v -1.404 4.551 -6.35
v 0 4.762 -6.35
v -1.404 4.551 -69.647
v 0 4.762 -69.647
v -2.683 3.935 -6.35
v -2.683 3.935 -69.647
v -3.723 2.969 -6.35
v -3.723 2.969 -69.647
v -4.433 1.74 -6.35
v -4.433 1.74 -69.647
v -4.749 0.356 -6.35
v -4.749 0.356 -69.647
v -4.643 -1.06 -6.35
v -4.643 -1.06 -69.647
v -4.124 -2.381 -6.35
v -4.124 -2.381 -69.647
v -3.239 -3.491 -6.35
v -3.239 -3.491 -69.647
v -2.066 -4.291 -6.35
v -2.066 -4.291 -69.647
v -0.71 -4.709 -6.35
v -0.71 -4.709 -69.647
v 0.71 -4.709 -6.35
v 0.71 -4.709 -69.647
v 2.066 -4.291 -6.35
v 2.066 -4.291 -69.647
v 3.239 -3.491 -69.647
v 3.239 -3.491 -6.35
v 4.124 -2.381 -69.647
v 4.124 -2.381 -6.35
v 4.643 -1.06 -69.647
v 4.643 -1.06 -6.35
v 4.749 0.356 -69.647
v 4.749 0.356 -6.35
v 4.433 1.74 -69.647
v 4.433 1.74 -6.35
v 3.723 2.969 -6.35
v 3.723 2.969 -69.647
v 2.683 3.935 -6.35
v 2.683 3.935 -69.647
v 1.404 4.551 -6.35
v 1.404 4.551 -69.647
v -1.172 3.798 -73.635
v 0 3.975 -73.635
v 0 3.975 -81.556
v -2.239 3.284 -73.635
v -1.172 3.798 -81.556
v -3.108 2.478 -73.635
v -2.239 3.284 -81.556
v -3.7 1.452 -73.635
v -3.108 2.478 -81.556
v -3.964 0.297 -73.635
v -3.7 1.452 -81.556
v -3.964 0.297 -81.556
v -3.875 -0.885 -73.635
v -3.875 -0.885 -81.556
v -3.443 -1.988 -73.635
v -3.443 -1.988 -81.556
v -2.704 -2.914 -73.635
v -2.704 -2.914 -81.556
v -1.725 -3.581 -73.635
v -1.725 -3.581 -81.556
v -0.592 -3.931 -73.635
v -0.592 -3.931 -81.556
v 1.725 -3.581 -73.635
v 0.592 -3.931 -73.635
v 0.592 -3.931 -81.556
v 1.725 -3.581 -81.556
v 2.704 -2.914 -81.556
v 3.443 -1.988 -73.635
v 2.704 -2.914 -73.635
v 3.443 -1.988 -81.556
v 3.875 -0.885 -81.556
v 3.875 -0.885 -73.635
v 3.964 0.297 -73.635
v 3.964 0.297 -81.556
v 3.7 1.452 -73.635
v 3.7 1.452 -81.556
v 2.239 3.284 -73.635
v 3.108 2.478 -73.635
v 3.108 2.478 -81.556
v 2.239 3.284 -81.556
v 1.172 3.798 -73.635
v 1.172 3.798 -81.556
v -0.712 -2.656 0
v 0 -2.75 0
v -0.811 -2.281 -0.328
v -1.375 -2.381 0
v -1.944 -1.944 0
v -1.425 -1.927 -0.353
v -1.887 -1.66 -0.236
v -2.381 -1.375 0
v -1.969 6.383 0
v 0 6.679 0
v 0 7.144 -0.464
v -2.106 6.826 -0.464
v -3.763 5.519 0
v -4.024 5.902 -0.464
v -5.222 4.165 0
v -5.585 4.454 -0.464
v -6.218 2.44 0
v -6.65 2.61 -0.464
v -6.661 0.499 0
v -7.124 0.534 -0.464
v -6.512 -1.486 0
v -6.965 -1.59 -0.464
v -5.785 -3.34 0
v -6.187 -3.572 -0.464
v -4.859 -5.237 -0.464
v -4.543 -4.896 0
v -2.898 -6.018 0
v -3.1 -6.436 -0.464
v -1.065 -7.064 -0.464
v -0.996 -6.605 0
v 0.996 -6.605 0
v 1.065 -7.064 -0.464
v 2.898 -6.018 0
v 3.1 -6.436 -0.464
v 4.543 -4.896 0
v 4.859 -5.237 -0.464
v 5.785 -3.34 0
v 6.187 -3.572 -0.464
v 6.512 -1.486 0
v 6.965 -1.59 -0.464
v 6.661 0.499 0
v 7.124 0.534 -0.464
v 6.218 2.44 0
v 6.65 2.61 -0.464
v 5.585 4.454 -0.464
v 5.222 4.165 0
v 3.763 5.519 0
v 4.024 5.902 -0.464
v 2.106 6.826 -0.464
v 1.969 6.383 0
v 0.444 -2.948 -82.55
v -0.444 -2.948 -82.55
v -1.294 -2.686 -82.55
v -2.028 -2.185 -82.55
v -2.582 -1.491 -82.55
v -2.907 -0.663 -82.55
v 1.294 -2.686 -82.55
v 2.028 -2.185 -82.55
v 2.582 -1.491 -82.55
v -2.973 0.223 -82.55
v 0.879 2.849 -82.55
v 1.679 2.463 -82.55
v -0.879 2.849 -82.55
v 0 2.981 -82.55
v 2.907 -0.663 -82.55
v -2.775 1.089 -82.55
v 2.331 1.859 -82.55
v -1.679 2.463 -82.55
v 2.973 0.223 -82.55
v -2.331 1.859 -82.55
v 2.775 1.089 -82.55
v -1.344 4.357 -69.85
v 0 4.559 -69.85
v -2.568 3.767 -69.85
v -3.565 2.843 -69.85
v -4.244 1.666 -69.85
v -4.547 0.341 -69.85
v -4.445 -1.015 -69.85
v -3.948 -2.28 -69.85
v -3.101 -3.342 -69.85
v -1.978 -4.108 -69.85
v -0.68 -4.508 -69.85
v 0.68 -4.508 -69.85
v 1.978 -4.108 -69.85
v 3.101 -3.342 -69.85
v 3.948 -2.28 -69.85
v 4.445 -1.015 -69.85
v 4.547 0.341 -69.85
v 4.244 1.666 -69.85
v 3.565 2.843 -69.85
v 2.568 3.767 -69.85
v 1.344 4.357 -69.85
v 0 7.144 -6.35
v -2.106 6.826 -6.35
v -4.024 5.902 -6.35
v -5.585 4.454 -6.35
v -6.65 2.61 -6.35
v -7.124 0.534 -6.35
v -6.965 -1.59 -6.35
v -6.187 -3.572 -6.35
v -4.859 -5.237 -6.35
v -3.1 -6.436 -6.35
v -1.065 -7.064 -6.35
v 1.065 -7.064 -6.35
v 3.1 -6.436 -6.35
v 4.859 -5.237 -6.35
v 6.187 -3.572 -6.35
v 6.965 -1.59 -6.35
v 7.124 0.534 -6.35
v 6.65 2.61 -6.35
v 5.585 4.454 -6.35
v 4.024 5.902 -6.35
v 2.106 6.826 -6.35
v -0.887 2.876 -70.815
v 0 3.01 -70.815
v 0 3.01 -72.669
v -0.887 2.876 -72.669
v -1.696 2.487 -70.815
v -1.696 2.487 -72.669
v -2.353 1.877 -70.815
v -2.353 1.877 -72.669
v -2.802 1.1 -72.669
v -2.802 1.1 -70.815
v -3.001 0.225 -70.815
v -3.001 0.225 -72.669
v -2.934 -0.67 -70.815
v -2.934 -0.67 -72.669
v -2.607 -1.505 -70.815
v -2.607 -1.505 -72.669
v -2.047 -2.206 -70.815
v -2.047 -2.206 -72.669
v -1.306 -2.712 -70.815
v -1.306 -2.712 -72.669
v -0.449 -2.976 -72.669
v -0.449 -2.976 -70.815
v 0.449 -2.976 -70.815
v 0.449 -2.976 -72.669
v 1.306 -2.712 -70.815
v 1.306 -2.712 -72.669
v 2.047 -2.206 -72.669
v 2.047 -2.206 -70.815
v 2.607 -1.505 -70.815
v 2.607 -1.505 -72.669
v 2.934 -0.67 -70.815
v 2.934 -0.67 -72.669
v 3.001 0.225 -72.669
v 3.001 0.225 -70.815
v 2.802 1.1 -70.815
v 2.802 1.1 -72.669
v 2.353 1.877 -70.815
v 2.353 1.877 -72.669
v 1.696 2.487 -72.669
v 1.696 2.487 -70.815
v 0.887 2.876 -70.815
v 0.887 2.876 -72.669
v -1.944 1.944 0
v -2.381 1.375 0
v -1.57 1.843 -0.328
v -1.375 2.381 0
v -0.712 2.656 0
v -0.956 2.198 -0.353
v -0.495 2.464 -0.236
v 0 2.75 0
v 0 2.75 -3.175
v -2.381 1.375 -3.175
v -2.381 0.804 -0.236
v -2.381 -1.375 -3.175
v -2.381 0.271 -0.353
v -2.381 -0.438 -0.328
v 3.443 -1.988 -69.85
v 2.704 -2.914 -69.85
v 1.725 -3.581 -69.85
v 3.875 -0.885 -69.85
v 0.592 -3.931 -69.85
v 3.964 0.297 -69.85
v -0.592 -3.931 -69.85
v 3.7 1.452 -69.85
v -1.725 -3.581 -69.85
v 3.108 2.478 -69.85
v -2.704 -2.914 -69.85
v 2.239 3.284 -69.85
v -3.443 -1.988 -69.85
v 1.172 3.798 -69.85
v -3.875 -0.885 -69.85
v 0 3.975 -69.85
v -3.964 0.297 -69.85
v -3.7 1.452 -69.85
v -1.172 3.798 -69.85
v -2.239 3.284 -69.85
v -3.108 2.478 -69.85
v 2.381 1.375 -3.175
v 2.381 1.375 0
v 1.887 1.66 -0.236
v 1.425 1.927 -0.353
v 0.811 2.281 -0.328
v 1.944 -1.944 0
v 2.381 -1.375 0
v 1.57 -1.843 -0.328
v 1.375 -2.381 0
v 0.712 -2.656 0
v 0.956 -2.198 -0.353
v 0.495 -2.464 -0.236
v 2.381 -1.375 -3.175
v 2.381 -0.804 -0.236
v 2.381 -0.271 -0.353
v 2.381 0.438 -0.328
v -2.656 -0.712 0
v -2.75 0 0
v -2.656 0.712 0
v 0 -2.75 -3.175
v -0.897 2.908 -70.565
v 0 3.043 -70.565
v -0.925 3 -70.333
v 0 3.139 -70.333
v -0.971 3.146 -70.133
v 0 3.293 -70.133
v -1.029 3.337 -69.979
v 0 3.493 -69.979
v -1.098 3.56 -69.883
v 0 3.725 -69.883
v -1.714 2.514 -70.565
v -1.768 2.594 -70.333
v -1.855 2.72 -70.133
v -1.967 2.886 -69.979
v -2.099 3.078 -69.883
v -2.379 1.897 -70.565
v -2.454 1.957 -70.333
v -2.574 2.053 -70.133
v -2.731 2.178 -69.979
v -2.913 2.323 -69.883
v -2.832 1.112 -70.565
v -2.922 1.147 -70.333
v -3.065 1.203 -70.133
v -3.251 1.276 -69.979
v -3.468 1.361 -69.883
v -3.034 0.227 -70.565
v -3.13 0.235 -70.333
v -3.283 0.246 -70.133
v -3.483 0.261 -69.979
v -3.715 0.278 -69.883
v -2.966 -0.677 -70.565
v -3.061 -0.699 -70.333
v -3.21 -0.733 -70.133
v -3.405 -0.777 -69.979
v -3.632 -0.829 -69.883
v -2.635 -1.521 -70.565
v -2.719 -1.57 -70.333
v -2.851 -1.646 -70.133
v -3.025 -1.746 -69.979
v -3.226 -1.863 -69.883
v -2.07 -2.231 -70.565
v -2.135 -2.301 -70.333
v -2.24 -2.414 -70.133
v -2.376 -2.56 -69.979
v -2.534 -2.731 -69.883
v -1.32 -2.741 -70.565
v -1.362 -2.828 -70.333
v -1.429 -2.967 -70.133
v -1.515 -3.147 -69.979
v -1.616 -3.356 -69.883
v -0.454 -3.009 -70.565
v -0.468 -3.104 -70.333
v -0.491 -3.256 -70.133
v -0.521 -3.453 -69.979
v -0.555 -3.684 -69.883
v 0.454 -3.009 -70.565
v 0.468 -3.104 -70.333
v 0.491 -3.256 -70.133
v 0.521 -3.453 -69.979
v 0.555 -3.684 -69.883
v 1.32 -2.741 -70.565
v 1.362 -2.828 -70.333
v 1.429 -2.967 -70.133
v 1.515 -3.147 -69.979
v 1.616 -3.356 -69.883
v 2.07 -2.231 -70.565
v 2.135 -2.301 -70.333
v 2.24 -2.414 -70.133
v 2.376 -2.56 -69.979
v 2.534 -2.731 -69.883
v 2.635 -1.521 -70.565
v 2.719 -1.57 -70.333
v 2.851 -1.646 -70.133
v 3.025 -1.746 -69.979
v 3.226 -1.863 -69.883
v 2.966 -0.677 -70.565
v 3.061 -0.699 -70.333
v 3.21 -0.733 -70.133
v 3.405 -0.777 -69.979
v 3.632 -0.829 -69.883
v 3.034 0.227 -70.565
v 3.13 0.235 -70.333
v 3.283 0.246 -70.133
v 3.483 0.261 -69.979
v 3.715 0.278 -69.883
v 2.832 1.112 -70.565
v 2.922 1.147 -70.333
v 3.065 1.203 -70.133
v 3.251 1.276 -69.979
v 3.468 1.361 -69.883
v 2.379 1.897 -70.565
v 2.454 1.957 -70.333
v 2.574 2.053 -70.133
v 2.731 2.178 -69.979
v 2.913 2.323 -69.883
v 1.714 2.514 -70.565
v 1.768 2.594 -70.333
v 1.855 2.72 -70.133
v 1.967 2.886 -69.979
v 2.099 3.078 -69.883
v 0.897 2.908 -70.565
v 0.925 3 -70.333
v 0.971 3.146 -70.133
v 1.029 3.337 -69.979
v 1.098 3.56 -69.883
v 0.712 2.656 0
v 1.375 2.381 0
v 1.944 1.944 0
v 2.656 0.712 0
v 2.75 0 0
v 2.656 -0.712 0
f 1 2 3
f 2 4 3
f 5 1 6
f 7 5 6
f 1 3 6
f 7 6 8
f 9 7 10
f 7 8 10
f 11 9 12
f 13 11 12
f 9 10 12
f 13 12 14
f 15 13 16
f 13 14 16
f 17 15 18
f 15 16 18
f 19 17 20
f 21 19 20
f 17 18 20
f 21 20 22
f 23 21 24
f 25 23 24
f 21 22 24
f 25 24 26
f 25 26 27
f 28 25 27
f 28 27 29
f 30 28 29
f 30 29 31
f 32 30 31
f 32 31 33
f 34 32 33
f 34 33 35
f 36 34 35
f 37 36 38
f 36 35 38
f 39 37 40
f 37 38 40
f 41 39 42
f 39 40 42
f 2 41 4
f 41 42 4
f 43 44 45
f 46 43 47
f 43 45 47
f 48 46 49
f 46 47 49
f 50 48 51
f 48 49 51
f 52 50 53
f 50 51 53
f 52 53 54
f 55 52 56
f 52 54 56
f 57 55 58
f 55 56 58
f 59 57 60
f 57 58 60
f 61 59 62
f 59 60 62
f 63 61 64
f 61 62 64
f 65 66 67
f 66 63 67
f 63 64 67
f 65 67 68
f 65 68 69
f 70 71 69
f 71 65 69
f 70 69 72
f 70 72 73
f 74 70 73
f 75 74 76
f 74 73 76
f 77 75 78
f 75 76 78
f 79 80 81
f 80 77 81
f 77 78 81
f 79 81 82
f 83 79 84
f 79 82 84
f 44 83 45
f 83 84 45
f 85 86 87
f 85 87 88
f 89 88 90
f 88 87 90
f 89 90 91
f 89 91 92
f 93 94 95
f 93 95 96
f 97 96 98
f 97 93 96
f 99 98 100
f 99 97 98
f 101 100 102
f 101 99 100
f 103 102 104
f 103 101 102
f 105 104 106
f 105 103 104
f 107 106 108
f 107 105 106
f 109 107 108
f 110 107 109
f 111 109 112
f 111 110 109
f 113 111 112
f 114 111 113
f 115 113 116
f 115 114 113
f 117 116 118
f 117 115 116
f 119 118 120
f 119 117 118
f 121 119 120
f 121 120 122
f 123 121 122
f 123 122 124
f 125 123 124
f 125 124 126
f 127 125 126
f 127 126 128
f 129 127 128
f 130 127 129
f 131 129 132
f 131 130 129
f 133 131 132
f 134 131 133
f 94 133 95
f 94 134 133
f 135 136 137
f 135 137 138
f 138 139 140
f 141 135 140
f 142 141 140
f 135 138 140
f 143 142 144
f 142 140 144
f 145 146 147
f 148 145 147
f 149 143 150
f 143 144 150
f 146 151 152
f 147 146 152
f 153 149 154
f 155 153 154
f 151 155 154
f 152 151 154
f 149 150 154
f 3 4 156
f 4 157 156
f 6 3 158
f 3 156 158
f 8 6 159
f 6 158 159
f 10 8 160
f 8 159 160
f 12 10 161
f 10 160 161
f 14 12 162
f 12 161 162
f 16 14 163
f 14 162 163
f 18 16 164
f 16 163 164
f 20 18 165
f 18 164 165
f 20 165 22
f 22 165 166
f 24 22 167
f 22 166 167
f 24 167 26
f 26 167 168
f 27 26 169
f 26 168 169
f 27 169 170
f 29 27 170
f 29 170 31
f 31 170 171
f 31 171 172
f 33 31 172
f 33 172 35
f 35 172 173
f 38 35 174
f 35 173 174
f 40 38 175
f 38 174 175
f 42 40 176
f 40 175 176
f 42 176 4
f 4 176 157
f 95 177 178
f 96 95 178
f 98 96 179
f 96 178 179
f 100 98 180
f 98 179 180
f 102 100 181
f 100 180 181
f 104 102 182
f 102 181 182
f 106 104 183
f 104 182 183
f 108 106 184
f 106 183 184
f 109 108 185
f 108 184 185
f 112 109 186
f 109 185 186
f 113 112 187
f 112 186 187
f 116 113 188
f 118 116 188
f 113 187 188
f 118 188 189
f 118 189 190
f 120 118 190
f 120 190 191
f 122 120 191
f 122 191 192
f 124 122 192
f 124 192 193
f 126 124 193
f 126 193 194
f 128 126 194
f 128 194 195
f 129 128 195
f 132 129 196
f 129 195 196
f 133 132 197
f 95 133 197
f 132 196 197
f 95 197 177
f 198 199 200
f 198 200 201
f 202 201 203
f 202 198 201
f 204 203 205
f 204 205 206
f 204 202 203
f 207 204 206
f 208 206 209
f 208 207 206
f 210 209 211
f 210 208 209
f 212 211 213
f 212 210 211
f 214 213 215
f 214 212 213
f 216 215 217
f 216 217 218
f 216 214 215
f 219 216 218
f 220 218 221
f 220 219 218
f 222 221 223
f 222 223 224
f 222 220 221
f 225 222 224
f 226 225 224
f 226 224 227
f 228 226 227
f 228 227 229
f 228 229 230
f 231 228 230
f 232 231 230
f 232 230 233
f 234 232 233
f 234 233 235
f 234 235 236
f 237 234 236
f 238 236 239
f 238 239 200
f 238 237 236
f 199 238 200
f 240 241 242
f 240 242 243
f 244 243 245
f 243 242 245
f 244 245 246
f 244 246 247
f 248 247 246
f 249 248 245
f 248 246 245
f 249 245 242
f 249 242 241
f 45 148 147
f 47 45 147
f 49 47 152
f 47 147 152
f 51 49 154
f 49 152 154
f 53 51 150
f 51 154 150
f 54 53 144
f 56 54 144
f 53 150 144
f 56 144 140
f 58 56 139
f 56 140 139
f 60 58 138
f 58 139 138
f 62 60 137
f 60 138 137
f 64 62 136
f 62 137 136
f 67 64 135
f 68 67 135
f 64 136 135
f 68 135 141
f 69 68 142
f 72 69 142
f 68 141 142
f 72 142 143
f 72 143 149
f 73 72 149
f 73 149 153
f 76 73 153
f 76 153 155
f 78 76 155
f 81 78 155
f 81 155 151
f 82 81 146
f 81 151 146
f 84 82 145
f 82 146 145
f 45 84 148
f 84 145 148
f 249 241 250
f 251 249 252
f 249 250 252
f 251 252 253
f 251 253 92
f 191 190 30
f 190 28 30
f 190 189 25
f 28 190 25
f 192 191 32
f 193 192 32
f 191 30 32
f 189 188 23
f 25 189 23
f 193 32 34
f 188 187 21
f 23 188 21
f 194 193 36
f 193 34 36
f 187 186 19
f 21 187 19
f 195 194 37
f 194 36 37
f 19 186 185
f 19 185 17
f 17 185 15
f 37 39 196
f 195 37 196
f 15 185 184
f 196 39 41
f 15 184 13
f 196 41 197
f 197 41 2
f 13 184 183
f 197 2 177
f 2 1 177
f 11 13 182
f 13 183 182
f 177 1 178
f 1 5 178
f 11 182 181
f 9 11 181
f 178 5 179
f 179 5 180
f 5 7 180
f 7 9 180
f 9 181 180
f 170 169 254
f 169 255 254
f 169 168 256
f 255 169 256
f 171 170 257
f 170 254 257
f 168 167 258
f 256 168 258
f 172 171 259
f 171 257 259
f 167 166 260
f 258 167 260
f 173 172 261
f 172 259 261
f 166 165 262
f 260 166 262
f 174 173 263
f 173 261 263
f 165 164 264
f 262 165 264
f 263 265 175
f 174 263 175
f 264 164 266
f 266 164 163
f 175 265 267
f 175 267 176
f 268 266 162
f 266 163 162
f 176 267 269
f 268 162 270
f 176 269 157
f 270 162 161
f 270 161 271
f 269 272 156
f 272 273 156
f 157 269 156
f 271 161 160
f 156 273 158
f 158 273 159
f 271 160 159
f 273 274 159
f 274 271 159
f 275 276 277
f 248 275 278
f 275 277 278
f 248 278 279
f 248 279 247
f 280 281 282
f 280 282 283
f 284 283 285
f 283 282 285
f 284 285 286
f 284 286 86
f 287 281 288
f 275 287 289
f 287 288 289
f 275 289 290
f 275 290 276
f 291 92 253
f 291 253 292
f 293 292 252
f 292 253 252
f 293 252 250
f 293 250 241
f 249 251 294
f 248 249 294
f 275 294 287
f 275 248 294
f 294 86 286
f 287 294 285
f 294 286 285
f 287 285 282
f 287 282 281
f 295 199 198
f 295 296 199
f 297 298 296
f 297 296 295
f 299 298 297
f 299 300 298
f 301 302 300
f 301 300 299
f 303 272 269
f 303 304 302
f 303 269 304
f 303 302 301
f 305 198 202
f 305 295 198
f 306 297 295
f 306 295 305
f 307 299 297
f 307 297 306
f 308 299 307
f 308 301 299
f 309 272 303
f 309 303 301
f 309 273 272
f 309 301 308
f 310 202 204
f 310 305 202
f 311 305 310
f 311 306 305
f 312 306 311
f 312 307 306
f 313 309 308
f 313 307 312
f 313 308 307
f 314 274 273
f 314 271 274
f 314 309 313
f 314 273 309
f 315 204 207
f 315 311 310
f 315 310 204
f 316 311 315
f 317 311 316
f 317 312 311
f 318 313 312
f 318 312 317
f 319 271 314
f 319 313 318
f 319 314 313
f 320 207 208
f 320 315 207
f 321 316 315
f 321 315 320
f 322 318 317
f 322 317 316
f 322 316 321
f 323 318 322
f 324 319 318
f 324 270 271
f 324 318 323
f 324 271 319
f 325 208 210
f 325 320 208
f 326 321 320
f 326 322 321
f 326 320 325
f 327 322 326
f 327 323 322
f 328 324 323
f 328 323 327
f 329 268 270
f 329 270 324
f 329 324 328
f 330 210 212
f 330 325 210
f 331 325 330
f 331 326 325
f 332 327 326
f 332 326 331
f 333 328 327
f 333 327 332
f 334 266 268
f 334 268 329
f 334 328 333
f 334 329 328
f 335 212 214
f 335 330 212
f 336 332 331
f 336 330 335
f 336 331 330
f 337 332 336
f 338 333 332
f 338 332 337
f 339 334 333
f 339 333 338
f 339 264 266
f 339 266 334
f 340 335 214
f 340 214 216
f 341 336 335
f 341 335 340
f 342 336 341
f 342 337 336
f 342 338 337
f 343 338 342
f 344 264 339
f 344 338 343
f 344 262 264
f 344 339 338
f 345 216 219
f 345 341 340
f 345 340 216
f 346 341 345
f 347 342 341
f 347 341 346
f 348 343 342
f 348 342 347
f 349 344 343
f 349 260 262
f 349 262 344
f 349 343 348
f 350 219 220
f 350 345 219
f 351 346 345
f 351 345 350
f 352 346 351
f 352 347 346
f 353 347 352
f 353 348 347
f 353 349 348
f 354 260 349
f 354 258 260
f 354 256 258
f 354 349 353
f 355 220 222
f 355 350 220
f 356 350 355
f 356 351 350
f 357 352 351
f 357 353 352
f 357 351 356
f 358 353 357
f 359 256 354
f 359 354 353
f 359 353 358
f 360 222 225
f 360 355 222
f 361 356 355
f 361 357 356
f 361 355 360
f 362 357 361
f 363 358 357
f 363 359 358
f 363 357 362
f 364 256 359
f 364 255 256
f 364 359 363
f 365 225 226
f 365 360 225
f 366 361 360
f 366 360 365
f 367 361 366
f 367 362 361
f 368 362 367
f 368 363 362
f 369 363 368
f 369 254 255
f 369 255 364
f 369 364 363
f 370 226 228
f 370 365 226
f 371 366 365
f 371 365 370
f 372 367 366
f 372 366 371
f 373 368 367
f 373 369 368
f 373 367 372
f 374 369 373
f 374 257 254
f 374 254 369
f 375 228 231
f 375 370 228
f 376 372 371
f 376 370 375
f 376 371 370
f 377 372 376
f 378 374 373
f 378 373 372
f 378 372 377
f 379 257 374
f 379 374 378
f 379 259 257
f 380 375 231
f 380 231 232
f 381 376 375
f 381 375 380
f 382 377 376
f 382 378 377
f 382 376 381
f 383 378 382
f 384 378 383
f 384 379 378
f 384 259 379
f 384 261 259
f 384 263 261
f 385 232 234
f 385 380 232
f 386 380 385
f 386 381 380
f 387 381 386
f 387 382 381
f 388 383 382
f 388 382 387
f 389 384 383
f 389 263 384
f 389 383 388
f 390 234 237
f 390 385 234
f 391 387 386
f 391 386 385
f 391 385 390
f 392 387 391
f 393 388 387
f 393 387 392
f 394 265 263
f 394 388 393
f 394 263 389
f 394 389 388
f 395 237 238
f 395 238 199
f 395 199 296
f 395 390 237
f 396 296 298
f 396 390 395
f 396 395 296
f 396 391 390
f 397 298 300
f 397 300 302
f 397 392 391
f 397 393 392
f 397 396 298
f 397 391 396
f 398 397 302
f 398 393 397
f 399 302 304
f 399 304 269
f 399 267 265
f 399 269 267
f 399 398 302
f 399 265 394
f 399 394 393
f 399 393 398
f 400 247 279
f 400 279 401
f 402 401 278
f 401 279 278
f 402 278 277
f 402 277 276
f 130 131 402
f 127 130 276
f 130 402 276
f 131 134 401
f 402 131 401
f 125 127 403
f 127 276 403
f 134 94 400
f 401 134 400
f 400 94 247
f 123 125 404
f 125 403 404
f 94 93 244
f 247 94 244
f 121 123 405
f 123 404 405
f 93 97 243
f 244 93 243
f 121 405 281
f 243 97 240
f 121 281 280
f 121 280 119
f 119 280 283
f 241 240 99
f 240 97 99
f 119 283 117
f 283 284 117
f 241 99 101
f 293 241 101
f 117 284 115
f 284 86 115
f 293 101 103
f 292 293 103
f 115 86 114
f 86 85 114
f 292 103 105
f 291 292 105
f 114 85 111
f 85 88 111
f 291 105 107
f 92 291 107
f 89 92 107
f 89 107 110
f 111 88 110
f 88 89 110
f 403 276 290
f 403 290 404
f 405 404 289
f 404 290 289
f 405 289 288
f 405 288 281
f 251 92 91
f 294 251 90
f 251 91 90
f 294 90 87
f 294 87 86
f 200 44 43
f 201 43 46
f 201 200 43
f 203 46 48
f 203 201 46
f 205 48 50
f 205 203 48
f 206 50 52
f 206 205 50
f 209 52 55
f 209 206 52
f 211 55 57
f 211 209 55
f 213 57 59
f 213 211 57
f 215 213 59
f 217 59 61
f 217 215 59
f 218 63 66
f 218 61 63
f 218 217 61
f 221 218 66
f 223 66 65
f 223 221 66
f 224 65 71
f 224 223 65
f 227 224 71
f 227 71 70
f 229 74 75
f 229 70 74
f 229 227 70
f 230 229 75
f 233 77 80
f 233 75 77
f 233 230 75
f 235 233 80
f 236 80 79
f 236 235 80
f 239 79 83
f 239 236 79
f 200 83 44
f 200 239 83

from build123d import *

# Parameters (mm, degrees)
CHAMFER1_SIZE      = 0.993775
CHAMFER2_SIZE      = 0.46434375
CHAMFER3_SIZE      = 0.2032
CUT_EXTRUDE2_DEPTH = 3.175


with BuildPart() as part:
    # Sketch1 → Revolve1 (revolve)
    with BuildSketch(Plane(origin=(0, 0, 0), x_dir=(0, 0, -1), z_dir=(1, 0, 0))):
        Polygon((0, 7.14375), (6.35, 7.14375), (6.35, 4.7625), (69.85, 4.7625), (69.85, 3.9751), (82.55, 3.9751), (82.55, 0), (0, 0), align=None)
    revolve(axis=Axis((0, 0, -82.55), (0, 0, 1)))

    # Sketch5 → Cut-Revolve1 (revolve, cut)
    with BuildSketch(Plane(origin=(0, 0, 0), x_dir=(0, 0, -1), z_dir=(1, 0, 0))):
        with BuildLine():
            Line((69.85, 4.7625), (74.422, 4.7625))
            Line((74.422, 4.7625), (72.6694, 3.0099))
            Line((72.6694, 3.0099), (70.8152, 3.0099))
            ThreePointArc((70.8152, 3.0099), (70.132700535, 3.292600535), (69.85, 3.9751))
            Line((69.85, 3.9751), (69.85, 4.7625))
        make_face()
    revolve(axis=Axis((0, 0, -82.55), (0, 0, 1)), mode=Mode.SUBTRACT)

    # Chamfer1
    chamfer1_edges = [part.edges().sort_by_distance(p)[0] for p in [
        (0, -3.9751, -82.55),
    ]]
    chamfer(chamfer1_edges, length=CHAMFER1_SIZE)

    # Chamfer2
    chamfer2_edges = [part.edges().sort_by_distance(p)[0] for p in [
        (0, -7.14375, 0),
    ]]
    chamfer(chamfer2_edges, length=CHAMFER2_SIZE)

    # Chamfer3
    chamfer3_edges = [part.edges().sort_by_distance(p)[0] for p in [
        (0, -4.7625, -69.85),
    ]]
    chamfer(chamfer3_edges, length=CHAMFER3_SIZE)

    # Sketch8 → Cut-Extrude2 (cut)
    with BuildSketch(Plane.XY):
        Polygon((2.38125, 1.374815329), (0, 2.749630657), (-2.38125, 1.374815329), (-2.38125, -1.374815329), (0, -2.749630657), (2.38125, -1.374815329), align=None)
    extrude(amount=-CUT_EXTRUDE2_DEPTH, mode=Mode.SUBTRACT)

    # Cut-Extrude4 cone 1 section (through the dimple's axis) → Cut-Extrude4 (revolve, cut)
    with BuildSketch(Plane(origin=(0, 0, 0), x_dir=(0, -1, 0), z_dir=(1, 0, 0))):
        Polygon((0, 0), (2.749630657, 0), (0, 2.749630657), align=None)
    revolve(axis=Axis((0, 0, 0), (0, 0, -1)), mode=Mode.SUBTRACT)

    # Sketch12 → Revolve2 (revolve)
    with BuildSketch(Plane(origin=(0, 0, 0), x_dir=(0, 0, -1), z_dir=(1, 0, 0))):
        with BuildLine():
            Line((69.85, 4.5593), (69.6468, 4.7625))
            Line((69.6468, 4.7625), (6.35, 4.7625))
            Line((6.35, 4.7625), (6.35, 0))
            Line((6.35, 0), (69.85, 0))
            Line((69.85, 0), (72.6694, 0))
            Line((72.6694, 0), (72.6694, 3.0099))
            Line((72.6694, 3.0099), (70.8152, 3.0099))
            ThreePointArc((70.8152, 3.0099), (70.132700535, 3.292600535), (69.85, 3.9751))
            Line((69.85, 3.9751), (69.85, 4.5593))
        make_face()
    revolve(axis=Axis((0, 0, -6.35), (0, 0, -1)))


solid = part.part
